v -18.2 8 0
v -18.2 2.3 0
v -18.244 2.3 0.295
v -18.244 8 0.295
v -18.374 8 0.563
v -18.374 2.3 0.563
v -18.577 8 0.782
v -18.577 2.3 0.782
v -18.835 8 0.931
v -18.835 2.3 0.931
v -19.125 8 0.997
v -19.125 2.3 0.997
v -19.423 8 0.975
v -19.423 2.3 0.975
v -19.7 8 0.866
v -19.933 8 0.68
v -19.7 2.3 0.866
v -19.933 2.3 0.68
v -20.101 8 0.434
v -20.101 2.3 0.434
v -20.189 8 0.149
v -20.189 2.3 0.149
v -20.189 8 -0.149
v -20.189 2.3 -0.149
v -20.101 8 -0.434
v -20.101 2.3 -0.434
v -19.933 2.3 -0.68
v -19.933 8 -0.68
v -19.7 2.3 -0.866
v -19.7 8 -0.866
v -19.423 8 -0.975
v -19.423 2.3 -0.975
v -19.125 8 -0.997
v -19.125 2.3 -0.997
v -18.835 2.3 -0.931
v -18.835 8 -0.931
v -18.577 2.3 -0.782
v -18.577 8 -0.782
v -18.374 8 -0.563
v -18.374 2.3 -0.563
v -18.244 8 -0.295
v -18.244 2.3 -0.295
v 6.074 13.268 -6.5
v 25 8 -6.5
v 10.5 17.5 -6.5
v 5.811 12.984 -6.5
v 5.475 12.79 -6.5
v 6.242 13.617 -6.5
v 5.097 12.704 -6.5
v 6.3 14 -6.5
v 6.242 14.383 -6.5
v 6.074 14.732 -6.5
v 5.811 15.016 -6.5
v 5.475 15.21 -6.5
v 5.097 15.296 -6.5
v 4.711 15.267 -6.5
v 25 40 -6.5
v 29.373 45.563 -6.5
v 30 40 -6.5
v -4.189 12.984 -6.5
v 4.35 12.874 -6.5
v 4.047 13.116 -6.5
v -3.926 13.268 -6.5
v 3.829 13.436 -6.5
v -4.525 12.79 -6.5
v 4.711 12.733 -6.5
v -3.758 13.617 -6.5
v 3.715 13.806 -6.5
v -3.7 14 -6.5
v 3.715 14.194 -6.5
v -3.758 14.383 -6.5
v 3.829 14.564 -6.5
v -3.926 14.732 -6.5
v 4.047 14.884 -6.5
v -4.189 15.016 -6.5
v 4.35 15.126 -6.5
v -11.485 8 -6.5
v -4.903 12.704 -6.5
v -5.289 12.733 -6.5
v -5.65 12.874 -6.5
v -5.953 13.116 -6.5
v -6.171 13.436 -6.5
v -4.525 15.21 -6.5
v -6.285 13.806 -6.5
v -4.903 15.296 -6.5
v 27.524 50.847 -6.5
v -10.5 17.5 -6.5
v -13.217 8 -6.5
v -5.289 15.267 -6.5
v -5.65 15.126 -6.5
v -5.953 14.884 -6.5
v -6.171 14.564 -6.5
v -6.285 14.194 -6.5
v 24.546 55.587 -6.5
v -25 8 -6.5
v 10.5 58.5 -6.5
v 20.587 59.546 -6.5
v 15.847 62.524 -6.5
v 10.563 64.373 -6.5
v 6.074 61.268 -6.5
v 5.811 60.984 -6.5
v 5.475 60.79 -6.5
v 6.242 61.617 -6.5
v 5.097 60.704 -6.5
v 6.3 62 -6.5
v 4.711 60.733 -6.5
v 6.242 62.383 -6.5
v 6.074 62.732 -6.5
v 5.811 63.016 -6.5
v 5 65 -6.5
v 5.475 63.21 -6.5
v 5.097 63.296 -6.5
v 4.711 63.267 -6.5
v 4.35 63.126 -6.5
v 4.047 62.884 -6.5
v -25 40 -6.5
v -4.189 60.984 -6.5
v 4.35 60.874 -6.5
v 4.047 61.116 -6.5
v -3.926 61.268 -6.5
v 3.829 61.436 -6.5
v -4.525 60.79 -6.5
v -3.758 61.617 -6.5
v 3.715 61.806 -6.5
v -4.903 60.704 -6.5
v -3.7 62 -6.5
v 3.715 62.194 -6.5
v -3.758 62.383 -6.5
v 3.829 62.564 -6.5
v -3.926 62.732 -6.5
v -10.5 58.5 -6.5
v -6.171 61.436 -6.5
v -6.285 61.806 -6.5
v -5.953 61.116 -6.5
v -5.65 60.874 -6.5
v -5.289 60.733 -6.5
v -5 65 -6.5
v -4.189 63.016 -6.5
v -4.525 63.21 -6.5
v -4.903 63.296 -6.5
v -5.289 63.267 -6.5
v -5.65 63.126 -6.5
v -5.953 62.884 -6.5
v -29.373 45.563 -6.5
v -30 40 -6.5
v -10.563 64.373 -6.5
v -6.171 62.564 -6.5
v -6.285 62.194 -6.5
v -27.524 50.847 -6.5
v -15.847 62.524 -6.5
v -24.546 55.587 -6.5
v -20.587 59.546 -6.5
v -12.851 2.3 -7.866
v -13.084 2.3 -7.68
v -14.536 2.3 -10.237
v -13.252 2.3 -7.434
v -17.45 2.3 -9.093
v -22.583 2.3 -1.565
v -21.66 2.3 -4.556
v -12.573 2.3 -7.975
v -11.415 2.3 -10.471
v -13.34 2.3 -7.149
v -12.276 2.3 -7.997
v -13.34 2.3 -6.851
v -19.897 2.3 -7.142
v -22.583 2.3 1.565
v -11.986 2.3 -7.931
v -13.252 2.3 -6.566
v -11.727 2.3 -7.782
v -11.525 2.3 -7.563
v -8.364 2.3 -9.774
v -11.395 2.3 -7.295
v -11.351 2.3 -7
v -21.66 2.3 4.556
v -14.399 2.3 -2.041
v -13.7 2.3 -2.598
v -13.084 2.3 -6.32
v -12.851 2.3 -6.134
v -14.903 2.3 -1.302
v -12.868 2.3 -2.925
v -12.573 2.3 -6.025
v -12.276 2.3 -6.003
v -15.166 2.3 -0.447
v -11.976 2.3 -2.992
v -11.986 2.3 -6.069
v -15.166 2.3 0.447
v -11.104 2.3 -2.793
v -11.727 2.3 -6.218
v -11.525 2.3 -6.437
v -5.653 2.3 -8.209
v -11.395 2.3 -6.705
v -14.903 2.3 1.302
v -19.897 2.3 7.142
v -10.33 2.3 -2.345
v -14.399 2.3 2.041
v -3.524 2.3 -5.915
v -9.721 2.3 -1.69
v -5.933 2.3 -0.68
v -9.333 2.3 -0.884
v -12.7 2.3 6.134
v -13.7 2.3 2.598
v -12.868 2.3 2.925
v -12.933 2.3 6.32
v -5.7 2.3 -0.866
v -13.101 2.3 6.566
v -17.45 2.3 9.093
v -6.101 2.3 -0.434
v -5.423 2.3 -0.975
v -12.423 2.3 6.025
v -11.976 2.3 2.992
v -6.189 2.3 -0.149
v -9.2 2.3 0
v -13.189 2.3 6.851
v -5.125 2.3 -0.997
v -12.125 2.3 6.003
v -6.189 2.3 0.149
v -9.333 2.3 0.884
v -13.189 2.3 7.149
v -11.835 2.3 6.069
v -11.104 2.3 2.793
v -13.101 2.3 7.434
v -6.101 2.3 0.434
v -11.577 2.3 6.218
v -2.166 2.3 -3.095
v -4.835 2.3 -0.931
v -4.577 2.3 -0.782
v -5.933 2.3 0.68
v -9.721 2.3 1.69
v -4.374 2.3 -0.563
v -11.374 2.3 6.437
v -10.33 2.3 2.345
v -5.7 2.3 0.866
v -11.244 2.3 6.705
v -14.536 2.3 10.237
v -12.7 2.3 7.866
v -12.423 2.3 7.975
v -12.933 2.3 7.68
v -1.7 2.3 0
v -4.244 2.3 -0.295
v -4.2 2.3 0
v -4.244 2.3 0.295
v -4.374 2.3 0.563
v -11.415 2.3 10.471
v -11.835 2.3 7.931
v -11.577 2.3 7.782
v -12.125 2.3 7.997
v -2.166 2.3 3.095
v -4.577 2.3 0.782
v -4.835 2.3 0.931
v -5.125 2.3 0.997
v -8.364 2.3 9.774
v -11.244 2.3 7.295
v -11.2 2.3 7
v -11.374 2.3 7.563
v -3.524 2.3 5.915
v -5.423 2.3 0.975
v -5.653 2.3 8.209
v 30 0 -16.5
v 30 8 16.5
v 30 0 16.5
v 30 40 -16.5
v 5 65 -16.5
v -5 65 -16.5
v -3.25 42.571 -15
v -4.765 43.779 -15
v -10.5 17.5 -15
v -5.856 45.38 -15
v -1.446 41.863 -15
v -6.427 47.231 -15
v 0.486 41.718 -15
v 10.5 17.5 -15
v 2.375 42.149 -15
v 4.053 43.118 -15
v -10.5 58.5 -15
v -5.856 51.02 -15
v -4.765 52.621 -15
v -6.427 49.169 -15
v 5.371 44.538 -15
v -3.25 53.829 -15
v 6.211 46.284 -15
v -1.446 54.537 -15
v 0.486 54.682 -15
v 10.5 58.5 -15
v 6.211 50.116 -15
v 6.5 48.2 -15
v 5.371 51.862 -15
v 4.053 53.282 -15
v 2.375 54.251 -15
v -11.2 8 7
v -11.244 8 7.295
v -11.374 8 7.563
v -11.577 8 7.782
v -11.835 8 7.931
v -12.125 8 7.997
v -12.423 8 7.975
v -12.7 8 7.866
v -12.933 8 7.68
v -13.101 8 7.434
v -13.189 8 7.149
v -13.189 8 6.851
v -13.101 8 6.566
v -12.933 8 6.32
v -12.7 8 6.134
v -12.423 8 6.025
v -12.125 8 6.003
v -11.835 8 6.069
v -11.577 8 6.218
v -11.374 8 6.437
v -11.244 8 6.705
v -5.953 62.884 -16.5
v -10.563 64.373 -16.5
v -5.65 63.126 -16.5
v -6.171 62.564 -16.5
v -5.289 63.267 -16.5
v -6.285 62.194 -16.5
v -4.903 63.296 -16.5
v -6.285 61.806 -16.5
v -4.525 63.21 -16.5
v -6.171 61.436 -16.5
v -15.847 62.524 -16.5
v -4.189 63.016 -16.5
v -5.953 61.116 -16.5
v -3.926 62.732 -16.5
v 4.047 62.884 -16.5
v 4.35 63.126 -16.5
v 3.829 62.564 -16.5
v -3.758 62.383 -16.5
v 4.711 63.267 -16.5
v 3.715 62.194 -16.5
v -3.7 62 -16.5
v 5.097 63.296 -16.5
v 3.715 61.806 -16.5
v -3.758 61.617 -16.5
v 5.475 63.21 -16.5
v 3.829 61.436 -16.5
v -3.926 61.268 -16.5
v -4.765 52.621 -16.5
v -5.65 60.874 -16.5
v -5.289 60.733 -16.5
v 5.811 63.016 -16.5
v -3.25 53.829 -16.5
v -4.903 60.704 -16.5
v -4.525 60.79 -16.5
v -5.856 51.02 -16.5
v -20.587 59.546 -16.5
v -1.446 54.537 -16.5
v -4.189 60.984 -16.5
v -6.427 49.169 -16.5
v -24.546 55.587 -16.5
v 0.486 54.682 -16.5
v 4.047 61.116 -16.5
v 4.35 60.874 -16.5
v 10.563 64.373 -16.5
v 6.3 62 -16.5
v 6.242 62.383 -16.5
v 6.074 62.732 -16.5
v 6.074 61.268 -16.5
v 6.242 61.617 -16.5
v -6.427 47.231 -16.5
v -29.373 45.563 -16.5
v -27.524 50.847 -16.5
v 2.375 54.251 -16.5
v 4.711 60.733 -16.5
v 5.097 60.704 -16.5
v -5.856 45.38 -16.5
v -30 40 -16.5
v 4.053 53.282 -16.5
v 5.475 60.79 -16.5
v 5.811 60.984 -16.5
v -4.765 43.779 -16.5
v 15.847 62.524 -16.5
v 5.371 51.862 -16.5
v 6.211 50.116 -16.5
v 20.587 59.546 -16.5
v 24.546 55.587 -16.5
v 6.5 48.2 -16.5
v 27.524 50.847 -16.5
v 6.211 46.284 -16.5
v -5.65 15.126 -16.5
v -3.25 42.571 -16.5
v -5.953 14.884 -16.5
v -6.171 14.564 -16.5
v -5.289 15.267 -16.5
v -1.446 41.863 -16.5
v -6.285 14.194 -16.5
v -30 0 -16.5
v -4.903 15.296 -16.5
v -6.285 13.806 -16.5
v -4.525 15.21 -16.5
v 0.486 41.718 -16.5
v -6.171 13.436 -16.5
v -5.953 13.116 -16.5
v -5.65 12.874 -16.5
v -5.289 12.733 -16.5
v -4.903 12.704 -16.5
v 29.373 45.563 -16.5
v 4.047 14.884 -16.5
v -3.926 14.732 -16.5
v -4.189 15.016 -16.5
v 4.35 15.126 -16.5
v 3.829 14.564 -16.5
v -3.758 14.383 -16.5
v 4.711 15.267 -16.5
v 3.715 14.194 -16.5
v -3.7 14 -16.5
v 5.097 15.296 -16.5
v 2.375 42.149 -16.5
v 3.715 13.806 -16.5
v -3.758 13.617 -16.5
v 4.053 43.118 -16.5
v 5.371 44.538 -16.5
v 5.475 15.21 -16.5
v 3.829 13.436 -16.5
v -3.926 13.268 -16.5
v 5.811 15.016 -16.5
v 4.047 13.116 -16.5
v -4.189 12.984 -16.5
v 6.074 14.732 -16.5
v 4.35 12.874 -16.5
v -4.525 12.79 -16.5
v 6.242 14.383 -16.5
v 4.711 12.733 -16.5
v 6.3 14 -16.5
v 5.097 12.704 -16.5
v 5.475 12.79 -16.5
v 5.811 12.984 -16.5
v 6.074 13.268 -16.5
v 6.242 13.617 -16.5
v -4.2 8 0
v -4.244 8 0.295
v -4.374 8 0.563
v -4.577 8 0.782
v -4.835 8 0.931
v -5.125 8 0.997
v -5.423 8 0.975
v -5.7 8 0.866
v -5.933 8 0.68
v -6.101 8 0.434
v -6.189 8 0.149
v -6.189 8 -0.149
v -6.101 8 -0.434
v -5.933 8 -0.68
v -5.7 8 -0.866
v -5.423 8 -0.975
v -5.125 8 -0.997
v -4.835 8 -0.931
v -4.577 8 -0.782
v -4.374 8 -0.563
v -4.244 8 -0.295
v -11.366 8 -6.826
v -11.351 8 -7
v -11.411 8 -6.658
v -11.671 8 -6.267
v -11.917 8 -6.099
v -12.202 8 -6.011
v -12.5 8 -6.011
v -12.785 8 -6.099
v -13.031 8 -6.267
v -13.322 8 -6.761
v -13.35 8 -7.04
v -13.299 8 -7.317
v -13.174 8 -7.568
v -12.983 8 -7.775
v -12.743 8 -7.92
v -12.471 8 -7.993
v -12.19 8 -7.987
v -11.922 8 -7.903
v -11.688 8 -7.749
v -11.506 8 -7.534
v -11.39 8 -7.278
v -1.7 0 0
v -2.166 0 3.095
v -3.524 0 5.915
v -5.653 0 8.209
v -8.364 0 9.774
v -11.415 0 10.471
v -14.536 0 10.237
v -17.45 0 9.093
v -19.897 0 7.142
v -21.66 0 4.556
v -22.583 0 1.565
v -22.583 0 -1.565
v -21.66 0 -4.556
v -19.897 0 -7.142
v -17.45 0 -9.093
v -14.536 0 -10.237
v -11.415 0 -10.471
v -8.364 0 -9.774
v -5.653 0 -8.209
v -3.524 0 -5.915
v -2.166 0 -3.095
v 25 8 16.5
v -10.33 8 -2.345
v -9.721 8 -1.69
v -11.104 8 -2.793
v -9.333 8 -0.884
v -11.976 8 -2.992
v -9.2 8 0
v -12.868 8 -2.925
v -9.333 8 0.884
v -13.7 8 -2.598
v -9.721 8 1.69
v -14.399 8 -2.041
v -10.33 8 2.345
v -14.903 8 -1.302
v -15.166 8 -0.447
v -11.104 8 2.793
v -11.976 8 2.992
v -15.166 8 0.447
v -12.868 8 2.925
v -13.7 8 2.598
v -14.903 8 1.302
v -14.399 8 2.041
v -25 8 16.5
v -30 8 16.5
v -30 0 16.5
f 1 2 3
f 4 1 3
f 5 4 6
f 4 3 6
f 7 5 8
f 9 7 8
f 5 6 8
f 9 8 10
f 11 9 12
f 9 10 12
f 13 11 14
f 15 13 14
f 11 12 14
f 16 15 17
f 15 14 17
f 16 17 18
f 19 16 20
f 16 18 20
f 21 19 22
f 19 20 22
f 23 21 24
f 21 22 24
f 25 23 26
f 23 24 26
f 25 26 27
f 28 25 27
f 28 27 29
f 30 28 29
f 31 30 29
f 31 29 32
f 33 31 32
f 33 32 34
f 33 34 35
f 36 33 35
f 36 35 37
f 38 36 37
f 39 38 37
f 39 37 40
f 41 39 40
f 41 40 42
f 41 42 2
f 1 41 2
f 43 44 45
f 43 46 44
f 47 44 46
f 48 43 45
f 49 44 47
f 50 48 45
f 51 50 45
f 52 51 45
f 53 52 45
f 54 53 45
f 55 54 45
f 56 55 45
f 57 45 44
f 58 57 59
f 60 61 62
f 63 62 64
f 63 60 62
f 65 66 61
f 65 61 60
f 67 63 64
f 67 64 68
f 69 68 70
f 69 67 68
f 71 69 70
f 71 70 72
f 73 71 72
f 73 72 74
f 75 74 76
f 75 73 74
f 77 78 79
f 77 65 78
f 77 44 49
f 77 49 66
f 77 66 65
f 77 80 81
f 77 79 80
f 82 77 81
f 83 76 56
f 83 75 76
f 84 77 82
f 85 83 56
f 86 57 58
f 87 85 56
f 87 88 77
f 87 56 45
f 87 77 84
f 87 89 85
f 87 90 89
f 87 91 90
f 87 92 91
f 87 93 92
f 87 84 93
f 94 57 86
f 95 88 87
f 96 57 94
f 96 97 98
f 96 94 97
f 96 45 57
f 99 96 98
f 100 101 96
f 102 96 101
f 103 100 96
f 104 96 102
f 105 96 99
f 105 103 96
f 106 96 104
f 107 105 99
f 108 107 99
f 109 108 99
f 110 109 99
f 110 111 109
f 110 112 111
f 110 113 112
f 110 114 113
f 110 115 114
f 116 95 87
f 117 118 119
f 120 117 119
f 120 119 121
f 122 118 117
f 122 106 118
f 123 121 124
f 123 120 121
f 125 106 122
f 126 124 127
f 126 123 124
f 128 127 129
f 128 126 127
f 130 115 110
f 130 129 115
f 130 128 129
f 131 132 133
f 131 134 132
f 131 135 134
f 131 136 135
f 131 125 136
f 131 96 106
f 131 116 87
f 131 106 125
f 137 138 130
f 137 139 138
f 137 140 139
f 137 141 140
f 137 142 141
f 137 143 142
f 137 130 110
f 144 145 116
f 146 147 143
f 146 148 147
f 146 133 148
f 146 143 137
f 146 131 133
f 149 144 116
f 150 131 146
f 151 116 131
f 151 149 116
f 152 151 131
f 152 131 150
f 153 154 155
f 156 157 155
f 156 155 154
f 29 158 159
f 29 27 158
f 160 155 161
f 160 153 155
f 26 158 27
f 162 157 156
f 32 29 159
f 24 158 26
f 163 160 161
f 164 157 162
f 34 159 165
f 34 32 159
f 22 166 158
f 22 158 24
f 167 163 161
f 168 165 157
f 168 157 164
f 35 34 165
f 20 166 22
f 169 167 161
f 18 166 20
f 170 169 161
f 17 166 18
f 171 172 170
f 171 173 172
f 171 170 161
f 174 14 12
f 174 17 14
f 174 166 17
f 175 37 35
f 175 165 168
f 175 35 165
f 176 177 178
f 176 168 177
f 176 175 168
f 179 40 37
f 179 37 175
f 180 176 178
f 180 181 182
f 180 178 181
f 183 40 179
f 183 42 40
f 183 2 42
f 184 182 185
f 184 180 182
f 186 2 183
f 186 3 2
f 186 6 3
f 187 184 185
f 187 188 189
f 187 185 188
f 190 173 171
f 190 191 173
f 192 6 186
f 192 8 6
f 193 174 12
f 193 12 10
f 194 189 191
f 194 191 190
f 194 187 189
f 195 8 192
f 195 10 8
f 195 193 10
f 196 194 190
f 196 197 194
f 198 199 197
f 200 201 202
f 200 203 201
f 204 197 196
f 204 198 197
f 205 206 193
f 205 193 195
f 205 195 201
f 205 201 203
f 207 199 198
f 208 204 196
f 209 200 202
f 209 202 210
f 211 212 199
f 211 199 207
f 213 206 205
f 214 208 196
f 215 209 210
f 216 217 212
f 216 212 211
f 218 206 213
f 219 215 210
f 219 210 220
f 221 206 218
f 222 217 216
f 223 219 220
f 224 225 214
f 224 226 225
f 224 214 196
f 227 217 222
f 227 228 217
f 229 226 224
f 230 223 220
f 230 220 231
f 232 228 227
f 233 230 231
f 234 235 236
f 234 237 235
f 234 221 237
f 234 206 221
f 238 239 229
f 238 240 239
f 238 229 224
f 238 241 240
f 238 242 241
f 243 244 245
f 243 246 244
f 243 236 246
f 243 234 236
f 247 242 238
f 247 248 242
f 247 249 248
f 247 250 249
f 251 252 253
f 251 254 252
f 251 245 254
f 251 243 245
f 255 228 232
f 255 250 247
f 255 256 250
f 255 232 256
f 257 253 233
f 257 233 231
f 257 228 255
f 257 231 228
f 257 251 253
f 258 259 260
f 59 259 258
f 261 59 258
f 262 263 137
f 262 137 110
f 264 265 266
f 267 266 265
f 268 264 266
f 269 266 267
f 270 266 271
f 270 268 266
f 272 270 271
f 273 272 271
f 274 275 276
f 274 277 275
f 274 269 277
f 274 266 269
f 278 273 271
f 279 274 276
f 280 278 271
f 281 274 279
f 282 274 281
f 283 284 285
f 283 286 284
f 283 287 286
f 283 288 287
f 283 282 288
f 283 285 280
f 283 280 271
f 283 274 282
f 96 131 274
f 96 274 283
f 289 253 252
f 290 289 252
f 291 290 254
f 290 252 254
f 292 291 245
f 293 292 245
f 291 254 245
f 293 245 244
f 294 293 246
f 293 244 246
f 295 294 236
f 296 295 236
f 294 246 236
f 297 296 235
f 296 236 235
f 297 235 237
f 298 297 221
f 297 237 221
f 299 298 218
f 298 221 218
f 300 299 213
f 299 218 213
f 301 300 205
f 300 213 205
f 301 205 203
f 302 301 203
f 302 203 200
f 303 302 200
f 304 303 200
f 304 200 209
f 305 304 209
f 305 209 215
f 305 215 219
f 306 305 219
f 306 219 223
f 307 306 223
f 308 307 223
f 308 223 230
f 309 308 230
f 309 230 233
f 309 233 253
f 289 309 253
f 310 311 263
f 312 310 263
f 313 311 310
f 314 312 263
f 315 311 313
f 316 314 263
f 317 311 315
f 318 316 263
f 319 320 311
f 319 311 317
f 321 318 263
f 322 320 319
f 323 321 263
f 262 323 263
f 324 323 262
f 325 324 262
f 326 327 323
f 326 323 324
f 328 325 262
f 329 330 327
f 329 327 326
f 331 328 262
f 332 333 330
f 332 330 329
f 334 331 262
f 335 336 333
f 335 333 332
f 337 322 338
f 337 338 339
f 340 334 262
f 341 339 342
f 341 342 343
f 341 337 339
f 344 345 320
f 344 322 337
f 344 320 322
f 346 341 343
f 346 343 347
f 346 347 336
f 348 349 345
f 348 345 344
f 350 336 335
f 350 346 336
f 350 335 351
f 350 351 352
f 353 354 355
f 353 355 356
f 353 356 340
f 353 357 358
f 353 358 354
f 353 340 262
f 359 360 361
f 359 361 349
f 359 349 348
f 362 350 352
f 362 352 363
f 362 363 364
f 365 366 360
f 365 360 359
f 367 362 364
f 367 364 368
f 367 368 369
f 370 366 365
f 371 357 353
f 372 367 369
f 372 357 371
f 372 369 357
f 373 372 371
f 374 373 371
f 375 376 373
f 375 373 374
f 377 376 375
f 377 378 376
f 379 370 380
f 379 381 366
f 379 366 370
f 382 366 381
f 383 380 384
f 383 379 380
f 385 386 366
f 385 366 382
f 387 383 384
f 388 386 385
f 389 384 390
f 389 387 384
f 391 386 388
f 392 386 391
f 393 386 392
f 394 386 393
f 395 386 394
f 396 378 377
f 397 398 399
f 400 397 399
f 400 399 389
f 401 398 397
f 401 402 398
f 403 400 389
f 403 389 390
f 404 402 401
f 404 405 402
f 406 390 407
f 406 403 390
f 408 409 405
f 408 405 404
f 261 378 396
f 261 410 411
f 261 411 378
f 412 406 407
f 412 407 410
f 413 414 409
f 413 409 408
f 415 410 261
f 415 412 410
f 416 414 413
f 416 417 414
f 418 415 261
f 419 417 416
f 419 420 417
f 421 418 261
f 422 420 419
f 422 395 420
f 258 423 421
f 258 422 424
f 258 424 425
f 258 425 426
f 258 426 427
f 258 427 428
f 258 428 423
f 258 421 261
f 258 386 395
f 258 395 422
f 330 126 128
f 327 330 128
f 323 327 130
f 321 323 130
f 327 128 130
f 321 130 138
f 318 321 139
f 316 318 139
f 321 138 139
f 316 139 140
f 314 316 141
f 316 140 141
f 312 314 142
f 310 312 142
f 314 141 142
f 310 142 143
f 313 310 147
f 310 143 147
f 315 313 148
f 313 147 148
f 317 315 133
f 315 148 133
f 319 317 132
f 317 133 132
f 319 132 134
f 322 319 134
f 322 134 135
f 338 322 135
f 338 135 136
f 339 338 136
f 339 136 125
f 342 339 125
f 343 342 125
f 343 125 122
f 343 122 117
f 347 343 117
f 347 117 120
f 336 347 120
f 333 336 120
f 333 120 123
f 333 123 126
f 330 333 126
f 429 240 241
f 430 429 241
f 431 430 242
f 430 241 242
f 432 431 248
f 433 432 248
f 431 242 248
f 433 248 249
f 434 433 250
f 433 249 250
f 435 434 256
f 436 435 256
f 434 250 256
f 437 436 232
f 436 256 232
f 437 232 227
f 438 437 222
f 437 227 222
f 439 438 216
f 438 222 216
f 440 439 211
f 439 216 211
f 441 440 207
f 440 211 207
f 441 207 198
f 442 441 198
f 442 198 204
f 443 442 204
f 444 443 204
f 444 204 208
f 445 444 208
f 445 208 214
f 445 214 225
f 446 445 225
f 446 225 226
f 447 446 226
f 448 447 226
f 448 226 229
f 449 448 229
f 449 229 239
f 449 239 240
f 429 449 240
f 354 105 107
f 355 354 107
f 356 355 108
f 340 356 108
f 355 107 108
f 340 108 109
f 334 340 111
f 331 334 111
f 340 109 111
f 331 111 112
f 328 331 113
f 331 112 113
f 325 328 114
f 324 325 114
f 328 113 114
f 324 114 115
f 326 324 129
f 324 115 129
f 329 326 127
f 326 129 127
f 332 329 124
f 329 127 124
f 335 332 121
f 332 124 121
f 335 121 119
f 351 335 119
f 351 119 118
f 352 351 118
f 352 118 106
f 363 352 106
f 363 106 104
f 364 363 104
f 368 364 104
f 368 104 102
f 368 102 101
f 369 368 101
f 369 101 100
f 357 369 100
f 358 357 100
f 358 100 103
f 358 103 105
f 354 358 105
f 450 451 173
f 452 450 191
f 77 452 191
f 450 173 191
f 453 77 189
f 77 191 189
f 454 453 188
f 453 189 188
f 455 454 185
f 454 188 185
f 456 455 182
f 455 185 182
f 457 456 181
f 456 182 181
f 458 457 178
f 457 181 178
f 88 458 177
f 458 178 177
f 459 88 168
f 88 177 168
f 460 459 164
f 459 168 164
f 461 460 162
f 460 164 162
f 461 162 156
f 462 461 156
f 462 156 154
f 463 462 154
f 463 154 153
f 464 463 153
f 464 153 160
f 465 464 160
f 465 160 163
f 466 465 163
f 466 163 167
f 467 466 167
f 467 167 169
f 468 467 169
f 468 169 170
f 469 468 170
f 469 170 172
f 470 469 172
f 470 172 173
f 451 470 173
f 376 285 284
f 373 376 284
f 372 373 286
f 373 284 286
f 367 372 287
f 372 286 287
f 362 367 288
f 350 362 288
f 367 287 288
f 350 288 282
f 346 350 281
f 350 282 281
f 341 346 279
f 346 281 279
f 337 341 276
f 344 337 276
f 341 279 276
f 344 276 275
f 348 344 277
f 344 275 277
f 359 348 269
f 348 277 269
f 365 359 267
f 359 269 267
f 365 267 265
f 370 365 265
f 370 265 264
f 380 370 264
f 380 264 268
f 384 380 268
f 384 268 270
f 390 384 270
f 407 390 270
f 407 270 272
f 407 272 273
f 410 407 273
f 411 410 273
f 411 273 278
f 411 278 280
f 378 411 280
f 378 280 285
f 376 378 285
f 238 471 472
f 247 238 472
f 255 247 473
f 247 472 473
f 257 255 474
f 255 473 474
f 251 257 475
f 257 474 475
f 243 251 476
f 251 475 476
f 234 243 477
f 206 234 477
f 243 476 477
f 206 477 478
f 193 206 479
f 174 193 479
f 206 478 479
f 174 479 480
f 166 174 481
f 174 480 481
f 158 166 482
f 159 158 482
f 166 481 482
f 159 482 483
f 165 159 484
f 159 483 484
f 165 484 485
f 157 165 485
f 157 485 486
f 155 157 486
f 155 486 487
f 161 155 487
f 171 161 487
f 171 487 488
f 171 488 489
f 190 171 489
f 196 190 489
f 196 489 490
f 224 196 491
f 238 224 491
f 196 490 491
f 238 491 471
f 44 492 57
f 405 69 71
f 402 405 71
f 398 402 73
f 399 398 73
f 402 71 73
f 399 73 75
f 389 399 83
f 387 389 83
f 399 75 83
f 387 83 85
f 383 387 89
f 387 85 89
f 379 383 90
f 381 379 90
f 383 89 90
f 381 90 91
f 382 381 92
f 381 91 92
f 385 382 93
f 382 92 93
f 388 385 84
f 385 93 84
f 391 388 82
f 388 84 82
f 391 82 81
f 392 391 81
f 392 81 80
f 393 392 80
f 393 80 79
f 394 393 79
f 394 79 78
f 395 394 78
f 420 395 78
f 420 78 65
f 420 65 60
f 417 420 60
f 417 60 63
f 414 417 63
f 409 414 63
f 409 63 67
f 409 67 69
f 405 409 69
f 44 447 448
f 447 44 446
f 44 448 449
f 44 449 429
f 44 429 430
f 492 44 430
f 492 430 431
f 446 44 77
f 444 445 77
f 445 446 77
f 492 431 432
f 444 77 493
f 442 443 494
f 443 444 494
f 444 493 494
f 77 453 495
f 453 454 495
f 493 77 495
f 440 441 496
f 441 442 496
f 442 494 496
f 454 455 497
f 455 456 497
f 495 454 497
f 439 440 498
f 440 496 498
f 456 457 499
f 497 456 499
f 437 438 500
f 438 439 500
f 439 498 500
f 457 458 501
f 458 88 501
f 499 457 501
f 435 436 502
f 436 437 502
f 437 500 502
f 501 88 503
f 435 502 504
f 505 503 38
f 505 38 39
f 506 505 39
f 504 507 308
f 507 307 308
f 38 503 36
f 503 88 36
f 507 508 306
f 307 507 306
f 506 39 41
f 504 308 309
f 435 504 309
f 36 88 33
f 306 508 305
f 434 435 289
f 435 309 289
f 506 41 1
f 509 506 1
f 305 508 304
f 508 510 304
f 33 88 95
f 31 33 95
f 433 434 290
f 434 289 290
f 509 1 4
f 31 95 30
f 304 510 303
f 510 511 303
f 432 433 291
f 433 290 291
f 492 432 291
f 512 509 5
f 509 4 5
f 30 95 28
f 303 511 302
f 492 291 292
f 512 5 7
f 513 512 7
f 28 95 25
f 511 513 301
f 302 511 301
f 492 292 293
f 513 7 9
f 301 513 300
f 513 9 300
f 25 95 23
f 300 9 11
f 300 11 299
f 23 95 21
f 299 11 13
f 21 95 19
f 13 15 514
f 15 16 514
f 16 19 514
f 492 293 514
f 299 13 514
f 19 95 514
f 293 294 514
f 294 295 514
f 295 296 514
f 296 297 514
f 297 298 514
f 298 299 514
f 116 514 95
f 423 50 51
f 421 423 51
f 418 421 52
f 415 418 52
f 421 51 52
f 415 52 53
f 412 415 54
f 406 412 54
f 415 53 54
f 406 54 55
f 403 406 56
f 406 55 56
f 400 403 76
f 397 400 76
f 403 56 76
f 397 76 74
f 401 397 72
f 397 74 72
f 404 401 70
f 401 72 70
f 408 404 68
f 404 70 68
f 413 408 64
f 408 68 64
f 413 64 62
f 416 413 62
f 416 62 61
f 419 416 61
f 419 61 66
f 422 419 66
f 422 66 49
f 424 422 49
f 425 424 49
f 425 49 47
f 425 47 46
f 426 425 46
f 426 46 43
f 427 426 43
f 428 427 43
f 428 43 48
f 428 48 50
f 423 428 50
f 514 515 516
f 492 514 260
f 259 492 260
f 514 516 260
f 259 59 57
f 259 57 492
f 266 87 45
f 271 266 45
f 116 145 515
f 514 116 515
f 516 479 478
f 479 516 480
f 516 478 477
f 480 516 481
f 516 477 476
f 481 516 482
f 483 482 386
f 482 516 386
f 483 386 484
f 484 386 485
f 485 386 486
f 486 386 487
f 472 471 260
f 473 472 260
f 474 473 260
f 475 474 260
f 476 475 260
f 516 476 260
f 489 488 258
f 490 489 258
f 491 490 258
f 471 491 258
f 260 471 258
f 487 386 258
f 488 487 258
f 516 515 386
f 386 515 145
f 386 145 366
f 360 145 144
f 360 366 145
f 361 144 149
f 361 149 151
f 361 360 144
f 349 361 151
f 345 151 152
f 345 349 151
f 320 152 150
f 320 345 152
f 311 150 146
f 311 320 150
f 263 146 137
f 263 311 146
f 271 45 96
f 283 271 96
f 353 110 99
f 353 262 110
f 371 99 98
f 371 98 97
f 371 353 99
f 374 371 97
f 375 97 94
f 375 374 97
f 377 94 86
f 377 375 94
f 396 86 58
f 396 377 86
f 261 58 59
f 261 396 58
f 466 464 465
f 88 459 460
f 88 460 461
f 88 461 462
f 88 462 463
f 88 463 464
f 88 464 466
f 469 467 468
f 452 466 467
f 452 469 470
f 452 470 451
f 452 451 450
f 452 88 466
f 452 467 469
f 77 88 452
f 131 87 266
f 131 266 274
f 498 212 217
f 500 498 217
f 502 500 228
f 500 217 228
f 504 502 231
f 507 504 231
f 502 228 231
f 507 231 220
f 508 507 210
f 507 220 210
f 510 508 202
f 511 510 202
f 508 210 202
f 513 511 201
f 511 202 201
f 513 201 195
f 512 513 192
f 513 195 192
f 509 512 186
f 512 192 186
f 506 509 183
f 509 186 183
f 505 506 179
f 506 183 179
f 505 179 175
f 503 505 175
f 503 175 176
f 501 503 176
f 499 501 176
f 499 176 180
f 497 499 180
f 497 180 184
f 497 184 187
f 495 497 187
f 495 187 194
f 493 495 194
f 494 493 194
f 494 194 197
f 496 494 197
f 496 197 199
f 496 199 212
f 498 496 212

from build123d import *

# Parameters (mm, degrees)
SKETCH2_W           = 60
SKETCH2_H           = 33
BOSS_EXTRUDE1_DEPTH = 65
SKETCH3_W           = 23
SKETCH3_H           = 57
CUT_EXTRUDE1_DEPTH  = 60
SKETCH4_W           = 21
SKETCH4_H           = 41
CUT_EXTRUDE2_DEPTH  = 8.5
SKETCH4_3_R         = 1.3
CUT_EXTRUDE3_DEPTH  = 11
SKETCH6_R           = 3
SKETCH6_R_2         = 1
CUT_EXTRUDE4_DEPTH  = 66
FILLET2_R           = 25
FILLET4_R           = 25
BOSS_EXTRUDE2_DEPTH = 5
SKETCH9_R           = 6.5
CUT_EXTRUDE5_DEPTH  = 2.5
SKETCH10_R          = 10.5
CUT_EXTRUDE6_DEPTH  = 2.3
SKETCH12_R          = 1
CUT_EXTRUDE7_DEPTH  = 5.7


with BuildPart() as part:
    # Sketch2 → Boss-Extrude1 (new body)
    with BuildSketch(Plane(origin=(0, 0, 0), x_dir=(1, 0, 0), z_dir=(0, 1, 0))):
        Rectangle(SKETCH2_W, SKETCH2_H)
    extrude(amount=BOSS_EXTRUDE1_DEPTH)

    # Sketch3 → Cut-Extrude1 (cut)
    with BuildSketch(Plane.ZY.offset(30)):
        with Locations((5, 36.5)):
            Rectangle(SKETCH3_W, SKETCH3_H)
    extrude(amount=-CUT_EXTRUDE1_DEPTH, mode=Mode.SUBTRACT)

    # Sketch4 → Cut-Extrude2 (cut)
    with BuildSketch(Plane.XY.offset(-6.5)):
        with Locations((0, 38)):
            Rectangle(SKETCH4_W, SKETCH4_H)
    extrude(amount=-CUT_EXTRUDE2_DEPTH, mode=Mode.SUBTRACT)

    # Sketch4<3> → Cut-Extrude3 (cut, through all)
    with BuildSketch(Plane.XY.offset(-6.5)):
        with Locations((5, 14)):
            Circle(SKETCH4_3_R)
        with Locations((-5, 62)):
            Circle(SKETCH4_3_R)
        with Locations((5, 62)):
            Circle(SKETCH4_3_R)
        with Locations((-5, 14)):
            Circle(SKETCH4_3_R)
    extrude(amount=-CUT_EXTRUDE3_DEPTH, mode=Mode.SUBTRACT)

    # Sketch6 → Cut-Extrude4 (cut, through all)
    with BuildSketch(Plane.XZ):
        with Locations((-12.2, 0)):
            Circle(SKETCH6_R)
        with Locations((-19.2, 0)):
            Circle(SKETCH6_R_2)
        with Locations((-5.2, 0)):
            Circle(SKETCH6_R_2)
        with Locations((-12.2, 7)):
            Circle(SKETCH6_R_2)
    extrude(amount=-CUT_EXTRUDE4_DEPTH, mode=Mode.SUBTRACT)

    # Fillet2
    fillet2_edges = [part.edges().sort_by_distance(p)[0] for p in [
        (-30, 65, -11.5),
    ]]
    fillet(fillet2_edges, radius=FILLET2_R)

    # Fillet4
    fillet4_edges = [part.edges().sort_by_distance(p)[0] for p in [
        (30, 65, -11.5),
    ]]
    fillet(fillet4_edges, radius=FILLET4_R)

    # Sketch8 → Boss-Extrude2 (add)
    with BuildSketch(Plane.ZY.offset(30)):
        Polygon((-6.5, 40), (16.5, 8), (-6.5, 8), align=None)
    boss_extrude2 = extrude(amount=-BOSS_EXTRUDE2_DEPTH)

    # Mirror1: Boss-Extrude2 across plane
    add(boss_extrude2.mirror(Plane(origin=(0, 0, 0), x_dir=(0, 0, 1), z_dir=(1, 0, 0))))

    # Sketch9 → Cut-Extrude5 (cut, through all)
    with BuildSketch(Plane.XY.offset(-15)):
        with Locations((0, 48.2)):
            Circle(SKETCH9_R)
    extrude(amount=-CUT_EXTRUDE5_DEPTH, mode=Mode.SUBTRACT)

    # Sketch10 → Cut-Extrude6 (cut)
    with BuildSketch(Plane.XZ):
        with Locations((-12.2, 0)):
            Circle(SKETCH10_R)
    extrude(amount=-CUT_EXTRUDE6_DEPTH, mode=Mode.SUBTRACT)

    # Sketch12 → Cut-Extrude7 (cut)
    with BuildSketch(Plane.XZ.offset(-2.3)):
        with Locations((-12.35085129, -7)):
            Circle(SKETCH12_R)
    extrude(amount=-CUT_EXTRUDE7_DEPTH, mode=Mode.SUBTRACT)


solid = part.part
